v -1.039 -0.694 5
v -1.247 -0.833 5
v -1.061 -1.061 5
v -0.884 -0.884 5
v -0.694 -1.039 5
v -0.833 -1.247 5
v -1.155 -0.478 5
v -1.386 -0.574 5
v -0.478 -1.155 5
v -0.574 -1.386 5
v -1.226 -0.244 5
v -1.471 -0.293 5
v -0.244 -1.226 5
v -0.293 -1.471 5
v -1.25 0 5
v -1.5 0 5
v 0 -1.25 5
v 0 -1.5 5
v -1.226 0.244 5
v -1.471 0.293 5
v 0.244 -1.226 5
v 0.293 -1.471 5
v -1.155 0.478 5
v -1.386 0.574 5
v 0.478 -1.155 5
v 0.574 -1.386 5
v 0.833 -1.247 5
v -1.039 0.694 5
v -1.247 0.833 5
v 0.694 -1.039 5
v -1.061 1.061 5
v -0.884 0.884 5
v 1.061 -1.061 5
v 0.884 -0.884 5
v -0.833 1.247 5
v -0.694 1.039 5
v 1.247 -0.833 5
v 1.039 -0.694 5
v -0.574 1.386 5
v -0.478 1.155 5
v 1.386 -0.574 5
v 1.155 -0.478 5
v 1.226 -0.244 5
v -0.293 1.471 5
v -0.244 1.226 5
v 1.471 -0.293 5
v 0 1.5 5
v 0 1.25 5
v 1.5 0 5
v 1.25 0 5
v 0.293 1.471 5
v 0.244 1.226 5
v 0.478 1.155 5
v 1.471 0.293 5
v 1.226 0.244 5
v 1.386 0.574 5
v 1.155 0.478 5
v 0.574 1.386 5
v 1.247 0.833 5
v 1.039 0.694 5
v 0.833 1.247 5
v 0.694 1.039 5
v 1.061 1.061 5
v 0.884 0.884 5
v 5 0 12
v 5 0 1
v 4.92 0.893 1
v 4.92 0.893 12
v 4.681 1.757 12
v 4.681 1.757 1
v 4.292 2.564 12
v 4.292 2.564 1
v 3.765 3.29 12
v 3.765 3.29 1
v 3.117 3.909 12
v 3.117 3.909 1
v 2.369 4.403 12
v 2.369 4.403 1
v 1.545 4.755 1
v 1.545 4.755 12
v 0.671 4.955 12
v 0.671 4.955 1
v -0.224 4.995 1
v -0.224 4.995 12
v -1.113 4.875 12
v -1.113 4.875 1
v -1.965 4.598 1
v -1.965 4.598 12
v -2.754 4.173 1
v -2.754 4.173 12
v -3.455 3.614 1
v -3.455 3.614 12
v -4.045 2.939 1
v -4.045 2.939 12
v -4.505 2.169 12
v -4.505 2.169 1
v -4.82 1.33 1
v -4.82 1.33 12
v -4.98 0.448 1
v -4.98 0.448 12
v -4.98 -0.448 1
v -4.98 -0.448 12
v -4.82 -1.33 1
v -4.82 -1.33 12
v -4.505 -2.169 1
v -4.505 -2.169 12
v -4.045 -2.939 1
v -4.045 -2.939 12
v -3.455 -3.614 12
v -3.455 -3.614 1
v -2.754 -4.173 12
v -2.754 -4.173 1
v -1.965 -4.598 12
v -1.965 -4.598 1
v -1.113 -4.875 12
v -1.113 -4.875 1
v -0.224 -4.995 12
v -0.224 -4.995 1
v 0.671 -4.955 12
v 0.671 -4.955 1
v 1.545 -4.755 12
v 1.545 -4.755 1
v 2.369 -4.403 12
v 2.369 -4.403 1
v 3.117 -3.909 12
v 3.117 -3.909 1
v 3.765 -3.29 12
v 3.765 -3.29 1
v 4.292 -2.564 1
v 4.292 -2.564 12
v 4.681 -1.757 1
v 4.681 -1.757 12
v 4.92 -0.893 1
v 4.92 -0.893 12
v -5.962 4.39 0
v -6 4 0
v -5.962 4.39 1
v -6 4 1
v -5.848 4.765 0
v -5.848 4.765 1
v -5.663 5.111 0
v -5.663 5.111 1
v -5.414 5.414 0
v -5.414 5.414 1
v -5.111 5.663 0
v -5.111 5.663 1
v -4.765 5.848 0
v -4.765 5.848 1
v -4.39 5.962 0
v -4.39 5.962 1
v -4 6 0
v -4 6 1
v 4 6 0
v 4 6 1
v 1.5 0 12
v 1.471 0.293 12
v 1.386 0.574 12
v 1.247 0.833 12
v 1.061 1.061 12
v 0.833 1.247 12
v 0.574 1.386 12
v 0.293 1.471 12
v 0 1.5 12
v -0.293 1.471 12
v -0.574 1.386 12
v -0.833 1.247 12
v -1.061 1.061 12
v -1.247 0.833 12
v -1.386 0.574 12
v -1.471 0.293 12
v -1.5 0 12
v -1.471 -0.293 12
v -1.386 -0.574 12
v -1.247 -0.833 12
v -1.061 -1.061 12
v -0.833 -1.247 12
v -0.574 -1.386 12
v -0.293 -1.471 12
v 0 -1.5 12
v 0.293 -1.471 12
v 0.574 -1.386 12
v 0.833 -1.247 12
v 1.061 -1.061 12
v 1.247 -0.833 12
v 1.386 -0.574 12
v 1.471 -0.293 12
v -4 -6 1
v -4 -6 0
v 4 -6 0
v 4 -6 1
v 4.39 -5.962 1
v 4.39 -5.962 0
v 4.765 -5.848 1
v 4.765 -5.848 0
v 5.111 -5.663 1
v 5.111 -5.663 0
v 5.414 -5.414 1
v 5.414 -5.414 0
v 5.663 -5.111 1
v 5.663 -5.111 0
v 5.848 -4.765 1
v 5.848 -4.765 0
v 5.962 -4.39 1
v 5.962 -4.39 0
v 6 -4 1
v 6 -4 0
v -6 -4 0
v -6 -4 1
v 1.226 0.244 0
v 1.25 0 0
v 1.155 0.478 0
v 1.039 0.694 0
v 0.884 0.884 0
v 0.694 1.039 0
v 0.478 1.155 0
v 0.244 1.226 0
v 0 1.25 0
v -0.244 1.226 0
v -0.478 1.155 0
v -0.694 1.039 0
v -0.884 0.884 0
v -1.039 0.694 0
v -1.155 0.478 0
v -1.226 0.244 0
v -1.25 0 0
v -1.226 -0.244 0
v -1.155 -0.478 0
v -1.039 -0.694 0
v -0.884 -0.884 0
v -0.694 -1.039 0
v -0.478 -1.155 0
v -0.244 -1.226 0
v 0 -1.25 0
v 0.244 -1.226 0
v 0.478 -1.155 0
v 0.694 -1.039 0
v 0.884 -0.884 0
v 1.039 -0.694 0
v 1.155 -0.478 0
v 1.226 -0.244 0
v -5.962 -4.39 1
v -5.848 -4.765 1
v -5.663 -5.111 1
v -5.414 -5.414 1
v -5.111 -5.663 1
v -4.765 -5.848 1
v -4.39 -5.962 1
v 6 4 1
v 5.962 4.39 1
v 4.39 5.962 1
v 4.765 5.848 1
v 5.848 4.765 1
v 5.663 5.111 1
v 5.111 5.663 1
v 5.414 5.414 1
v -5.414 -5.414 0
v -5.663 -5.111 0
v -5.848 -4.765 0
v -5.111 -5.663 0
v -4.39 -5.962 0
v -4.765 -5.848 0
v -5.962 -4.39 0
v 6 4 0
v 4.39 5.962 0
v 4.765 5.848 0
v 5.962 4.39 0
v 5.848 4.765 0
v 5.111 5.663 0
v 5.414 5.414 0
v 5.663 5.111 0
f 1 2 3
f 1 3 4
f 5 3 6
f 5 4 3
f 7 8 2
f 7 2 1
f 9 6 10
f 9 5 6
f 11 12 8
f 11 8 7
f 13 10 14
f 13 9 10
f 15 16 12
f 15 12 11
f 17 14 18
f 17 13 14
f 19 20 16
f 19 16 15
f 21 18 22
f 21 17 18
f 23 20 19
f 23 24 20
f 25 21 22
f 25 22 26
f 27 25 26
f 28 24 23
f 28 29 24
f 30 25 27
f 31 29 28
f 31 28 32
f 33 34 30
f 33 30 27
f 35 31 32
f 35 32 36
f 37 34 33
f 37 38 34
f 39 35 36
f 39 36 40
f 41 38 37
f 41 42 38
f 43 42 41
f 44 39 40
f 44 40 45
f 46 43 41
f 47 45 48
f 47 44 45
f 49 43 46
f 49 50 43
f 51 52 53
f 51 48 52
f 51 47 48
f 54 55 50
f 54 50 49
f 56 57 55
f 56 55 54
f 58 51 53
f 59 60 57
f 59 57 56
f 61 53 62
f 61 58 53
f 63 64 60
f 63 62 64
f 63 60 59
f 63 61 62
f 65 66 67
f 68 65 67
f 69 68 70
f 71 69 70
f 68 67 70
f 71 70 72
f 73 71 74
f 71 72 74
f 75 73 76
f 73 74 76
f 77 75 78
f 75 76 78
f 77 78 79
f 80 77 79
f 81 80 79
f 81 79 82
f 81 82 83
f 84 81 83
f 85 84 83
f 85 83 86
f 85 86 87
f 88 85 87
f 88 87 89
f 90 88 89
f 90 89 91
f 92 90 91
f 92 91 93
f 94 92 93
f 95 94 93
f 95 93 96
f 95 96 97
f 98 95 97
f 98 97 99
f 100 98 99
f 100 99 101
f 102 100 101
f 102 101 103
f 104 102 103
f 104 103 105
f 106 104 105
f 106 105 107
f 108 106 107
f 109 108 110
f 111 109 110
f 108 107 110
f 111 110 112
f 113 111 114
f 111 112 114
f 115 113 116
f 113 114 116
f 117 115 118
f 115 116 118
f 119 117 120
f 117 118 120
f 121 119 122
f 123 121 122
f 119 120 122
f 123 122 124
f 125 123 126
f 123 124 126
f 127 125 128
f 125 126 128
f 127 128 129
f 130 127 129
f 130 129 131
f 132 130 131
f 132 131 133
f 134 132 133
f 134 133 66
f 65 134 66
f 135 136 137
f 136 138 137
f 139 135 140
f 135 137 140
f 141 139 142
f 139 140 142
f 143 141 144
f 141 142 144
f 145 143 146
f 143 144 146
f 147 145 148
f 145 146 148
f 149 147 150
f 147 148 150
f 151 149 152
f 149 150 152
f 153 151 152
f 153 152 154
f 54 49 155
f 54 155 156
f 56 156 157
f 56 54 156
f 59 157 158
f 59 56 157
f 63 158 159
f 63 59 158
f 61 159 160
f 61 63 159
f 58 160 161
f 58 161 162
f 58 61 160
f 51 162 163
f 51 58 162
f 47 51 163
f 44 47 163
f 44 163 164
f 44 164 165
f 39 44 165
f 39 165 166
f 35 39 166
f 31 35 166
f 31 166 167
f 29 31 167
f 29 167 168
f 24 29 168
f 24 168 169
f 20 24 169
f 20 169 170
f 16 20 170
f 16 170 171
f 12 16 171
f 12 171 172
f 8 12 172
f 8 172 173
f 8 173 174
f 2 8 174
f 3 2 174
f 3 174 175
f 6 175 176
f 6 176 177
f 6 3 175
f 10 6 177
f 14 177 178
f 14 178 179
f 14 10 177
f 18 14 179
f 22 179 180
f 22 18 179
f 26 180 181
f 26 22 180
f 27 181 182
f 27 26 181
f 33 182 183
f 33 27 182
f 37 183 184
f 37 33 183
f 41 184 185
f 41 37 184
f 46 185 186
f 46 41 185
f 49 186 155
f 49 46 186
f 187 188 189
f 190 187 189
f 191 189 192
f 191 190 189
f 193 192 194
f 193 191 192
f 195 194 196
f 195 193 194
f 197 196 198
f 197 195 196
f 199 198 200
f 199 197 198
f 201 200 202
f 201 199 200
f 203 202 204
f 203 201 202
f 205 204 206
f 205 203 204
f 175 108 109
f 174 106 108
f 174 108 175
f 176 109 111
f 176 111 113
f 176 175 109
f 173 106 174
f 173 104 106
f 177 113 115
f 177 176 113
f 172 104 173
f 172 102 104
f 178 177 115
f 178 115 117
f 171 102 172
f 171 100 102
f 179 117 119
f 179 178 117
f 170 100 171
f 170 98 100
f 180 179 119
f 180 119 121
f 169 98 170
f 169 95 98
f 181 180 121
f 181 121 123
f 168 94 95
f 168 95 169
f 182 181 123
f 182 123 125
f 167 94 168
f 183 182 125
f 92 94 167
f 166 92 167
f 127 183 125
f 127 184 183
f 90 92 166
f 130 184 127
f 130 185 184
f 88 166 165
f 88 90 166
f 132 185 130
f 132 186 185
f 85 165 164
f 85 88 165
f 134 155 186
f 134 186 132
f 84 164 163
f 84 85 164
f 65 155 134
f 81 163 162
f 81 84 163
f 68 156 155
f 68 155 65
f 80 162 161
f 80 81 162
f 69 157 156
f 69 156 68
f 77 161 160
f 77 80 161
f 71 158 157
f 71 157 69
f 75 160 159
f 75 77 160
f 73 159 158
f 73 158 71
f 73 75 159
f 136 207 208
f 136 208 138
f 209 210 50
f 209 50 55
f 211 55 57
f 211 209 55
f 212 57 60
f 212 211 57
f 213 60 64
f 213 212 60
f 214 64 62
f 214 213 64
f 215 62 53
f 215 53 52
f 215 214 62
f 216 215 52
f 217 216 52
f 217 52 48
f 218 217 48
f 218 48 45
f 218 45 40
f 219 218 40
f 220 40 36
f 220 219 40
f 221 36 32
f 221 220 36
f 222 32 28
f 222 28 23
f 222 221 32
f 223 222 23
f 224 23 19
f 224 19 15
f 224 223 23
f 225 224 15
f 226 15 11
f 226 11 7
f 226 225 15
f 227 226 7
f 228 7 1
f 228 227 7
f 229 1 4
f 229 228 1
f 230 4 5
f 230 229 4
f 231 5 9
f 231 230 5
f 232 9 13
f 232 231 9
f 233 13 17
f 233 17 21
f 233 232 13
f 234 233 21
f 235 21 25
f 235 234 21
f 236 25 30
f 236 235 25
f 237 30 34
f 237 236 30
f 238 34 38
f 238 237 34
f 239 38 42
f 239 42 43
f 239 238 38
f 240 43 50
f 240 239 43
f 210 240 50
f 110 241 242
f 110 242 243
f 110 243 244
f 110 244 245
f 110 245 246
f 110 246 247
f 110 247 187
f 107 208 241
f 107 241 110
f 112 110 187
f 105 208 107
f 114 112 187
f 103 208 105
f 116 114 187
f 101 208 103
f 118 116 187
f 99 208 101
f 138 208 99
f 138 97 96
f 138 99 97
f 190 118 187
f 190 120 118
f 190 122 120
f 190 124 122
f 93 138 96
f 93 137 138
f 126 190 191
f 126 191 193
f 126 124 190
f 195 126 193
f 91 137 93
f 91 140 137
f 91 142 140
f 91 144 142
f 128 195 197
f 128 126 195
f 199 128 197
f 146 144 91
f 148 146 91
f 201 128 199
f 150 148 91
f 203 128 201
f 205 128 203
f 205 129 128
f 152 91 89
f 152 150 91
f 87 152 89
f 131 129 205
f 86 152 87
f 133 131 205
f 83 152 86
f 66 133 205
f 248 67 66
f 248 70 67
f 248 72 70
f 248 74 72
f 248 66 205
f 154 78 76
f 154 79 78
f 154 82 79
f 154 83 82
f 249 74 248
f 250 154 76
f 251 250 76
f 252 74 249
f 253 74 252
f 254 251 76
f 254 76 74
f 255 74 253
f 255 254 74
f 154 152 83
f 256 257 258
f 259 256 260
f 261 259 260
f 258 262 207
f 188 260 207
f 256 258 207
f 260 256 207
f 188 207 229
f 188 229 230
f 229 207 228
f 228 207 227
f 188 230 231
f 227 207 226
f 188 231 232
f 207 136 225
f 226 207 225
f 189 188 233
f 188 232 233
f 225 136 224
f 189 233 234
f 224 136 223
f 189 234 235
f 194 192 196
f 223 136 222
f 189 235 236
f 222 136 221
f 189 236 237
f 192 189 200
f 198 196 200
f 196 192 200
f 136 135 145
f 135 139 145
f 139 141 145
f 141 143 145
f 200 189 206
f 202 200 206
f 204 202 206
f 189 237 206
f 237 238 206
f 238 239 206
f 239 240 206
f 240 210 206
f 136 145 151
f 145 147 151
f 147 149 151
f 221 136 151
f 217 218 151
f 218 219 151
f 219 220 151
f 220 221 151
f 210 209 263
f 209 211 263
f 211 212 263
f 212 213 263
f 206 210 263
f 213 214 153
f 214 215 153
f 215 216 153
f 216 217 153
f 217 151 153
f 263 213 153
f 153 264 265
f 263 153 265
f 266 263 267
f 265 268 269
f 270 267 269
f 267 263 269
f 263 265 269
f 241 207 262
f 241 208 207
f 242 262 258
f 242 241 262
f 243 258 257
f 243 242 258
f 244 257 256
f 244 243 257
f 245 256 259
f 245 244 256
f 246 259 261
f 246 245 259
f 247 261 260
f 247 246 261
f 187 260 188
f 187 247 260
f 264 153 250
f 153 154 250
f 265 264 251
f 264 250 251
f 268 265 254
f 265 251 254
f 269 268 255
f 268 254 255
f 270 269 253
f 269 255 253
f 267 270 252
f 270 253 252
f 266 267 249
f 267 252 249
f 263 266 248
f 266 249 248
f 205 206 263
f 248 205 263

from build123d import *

# Parameters (mm, degrees)
F0_R     = 5
F0_R_2   = 1.5
F1_DEPTH = 12
F0_R_3   = 1.25
F2_DEPTH = 5
F0_W     = 12
F0_H     = 12
F3_DEPTH = 1
F4_R     = 2


with BuildPart() as f1:
    # F0 (on Top) → F1 (new body)
    with BuildSketch(Plane.XY):
        Circle(F0_R)
        Circle(F0_R_2, mode=Mode.SUBTRACT)
    extrude(amount=F1_DEPTH)

    # F0 (on Top) → F2 (join)
    with BuildSketch(Plane.XY):
        Circle(F0_R_2)
        Circle(F0_R_3, mode=Mode.SUBTRACT)
    extrude(amount=F2_DEPTH)

    # F0 (on Top) → F3 (join)
    with BuildSketch(Plane.XY):
        Rectangle(F0_W, F0_H)
        Circle(F0_R, mode=Mode.SUBTRACT)
    extrude(amount=F3_DEPTH)

    # F4
    f4_edges = [f1.edges().sort_by_distance(p)[0] for p in [
        (-6, -6, 0.5),
        (-6, 6, 0.5),
        (6, -6, 0.5),
        (6, 6, 0.5),
    ]]
    fillet(f4_edges, radius=F4_R)


solid = f1.part
